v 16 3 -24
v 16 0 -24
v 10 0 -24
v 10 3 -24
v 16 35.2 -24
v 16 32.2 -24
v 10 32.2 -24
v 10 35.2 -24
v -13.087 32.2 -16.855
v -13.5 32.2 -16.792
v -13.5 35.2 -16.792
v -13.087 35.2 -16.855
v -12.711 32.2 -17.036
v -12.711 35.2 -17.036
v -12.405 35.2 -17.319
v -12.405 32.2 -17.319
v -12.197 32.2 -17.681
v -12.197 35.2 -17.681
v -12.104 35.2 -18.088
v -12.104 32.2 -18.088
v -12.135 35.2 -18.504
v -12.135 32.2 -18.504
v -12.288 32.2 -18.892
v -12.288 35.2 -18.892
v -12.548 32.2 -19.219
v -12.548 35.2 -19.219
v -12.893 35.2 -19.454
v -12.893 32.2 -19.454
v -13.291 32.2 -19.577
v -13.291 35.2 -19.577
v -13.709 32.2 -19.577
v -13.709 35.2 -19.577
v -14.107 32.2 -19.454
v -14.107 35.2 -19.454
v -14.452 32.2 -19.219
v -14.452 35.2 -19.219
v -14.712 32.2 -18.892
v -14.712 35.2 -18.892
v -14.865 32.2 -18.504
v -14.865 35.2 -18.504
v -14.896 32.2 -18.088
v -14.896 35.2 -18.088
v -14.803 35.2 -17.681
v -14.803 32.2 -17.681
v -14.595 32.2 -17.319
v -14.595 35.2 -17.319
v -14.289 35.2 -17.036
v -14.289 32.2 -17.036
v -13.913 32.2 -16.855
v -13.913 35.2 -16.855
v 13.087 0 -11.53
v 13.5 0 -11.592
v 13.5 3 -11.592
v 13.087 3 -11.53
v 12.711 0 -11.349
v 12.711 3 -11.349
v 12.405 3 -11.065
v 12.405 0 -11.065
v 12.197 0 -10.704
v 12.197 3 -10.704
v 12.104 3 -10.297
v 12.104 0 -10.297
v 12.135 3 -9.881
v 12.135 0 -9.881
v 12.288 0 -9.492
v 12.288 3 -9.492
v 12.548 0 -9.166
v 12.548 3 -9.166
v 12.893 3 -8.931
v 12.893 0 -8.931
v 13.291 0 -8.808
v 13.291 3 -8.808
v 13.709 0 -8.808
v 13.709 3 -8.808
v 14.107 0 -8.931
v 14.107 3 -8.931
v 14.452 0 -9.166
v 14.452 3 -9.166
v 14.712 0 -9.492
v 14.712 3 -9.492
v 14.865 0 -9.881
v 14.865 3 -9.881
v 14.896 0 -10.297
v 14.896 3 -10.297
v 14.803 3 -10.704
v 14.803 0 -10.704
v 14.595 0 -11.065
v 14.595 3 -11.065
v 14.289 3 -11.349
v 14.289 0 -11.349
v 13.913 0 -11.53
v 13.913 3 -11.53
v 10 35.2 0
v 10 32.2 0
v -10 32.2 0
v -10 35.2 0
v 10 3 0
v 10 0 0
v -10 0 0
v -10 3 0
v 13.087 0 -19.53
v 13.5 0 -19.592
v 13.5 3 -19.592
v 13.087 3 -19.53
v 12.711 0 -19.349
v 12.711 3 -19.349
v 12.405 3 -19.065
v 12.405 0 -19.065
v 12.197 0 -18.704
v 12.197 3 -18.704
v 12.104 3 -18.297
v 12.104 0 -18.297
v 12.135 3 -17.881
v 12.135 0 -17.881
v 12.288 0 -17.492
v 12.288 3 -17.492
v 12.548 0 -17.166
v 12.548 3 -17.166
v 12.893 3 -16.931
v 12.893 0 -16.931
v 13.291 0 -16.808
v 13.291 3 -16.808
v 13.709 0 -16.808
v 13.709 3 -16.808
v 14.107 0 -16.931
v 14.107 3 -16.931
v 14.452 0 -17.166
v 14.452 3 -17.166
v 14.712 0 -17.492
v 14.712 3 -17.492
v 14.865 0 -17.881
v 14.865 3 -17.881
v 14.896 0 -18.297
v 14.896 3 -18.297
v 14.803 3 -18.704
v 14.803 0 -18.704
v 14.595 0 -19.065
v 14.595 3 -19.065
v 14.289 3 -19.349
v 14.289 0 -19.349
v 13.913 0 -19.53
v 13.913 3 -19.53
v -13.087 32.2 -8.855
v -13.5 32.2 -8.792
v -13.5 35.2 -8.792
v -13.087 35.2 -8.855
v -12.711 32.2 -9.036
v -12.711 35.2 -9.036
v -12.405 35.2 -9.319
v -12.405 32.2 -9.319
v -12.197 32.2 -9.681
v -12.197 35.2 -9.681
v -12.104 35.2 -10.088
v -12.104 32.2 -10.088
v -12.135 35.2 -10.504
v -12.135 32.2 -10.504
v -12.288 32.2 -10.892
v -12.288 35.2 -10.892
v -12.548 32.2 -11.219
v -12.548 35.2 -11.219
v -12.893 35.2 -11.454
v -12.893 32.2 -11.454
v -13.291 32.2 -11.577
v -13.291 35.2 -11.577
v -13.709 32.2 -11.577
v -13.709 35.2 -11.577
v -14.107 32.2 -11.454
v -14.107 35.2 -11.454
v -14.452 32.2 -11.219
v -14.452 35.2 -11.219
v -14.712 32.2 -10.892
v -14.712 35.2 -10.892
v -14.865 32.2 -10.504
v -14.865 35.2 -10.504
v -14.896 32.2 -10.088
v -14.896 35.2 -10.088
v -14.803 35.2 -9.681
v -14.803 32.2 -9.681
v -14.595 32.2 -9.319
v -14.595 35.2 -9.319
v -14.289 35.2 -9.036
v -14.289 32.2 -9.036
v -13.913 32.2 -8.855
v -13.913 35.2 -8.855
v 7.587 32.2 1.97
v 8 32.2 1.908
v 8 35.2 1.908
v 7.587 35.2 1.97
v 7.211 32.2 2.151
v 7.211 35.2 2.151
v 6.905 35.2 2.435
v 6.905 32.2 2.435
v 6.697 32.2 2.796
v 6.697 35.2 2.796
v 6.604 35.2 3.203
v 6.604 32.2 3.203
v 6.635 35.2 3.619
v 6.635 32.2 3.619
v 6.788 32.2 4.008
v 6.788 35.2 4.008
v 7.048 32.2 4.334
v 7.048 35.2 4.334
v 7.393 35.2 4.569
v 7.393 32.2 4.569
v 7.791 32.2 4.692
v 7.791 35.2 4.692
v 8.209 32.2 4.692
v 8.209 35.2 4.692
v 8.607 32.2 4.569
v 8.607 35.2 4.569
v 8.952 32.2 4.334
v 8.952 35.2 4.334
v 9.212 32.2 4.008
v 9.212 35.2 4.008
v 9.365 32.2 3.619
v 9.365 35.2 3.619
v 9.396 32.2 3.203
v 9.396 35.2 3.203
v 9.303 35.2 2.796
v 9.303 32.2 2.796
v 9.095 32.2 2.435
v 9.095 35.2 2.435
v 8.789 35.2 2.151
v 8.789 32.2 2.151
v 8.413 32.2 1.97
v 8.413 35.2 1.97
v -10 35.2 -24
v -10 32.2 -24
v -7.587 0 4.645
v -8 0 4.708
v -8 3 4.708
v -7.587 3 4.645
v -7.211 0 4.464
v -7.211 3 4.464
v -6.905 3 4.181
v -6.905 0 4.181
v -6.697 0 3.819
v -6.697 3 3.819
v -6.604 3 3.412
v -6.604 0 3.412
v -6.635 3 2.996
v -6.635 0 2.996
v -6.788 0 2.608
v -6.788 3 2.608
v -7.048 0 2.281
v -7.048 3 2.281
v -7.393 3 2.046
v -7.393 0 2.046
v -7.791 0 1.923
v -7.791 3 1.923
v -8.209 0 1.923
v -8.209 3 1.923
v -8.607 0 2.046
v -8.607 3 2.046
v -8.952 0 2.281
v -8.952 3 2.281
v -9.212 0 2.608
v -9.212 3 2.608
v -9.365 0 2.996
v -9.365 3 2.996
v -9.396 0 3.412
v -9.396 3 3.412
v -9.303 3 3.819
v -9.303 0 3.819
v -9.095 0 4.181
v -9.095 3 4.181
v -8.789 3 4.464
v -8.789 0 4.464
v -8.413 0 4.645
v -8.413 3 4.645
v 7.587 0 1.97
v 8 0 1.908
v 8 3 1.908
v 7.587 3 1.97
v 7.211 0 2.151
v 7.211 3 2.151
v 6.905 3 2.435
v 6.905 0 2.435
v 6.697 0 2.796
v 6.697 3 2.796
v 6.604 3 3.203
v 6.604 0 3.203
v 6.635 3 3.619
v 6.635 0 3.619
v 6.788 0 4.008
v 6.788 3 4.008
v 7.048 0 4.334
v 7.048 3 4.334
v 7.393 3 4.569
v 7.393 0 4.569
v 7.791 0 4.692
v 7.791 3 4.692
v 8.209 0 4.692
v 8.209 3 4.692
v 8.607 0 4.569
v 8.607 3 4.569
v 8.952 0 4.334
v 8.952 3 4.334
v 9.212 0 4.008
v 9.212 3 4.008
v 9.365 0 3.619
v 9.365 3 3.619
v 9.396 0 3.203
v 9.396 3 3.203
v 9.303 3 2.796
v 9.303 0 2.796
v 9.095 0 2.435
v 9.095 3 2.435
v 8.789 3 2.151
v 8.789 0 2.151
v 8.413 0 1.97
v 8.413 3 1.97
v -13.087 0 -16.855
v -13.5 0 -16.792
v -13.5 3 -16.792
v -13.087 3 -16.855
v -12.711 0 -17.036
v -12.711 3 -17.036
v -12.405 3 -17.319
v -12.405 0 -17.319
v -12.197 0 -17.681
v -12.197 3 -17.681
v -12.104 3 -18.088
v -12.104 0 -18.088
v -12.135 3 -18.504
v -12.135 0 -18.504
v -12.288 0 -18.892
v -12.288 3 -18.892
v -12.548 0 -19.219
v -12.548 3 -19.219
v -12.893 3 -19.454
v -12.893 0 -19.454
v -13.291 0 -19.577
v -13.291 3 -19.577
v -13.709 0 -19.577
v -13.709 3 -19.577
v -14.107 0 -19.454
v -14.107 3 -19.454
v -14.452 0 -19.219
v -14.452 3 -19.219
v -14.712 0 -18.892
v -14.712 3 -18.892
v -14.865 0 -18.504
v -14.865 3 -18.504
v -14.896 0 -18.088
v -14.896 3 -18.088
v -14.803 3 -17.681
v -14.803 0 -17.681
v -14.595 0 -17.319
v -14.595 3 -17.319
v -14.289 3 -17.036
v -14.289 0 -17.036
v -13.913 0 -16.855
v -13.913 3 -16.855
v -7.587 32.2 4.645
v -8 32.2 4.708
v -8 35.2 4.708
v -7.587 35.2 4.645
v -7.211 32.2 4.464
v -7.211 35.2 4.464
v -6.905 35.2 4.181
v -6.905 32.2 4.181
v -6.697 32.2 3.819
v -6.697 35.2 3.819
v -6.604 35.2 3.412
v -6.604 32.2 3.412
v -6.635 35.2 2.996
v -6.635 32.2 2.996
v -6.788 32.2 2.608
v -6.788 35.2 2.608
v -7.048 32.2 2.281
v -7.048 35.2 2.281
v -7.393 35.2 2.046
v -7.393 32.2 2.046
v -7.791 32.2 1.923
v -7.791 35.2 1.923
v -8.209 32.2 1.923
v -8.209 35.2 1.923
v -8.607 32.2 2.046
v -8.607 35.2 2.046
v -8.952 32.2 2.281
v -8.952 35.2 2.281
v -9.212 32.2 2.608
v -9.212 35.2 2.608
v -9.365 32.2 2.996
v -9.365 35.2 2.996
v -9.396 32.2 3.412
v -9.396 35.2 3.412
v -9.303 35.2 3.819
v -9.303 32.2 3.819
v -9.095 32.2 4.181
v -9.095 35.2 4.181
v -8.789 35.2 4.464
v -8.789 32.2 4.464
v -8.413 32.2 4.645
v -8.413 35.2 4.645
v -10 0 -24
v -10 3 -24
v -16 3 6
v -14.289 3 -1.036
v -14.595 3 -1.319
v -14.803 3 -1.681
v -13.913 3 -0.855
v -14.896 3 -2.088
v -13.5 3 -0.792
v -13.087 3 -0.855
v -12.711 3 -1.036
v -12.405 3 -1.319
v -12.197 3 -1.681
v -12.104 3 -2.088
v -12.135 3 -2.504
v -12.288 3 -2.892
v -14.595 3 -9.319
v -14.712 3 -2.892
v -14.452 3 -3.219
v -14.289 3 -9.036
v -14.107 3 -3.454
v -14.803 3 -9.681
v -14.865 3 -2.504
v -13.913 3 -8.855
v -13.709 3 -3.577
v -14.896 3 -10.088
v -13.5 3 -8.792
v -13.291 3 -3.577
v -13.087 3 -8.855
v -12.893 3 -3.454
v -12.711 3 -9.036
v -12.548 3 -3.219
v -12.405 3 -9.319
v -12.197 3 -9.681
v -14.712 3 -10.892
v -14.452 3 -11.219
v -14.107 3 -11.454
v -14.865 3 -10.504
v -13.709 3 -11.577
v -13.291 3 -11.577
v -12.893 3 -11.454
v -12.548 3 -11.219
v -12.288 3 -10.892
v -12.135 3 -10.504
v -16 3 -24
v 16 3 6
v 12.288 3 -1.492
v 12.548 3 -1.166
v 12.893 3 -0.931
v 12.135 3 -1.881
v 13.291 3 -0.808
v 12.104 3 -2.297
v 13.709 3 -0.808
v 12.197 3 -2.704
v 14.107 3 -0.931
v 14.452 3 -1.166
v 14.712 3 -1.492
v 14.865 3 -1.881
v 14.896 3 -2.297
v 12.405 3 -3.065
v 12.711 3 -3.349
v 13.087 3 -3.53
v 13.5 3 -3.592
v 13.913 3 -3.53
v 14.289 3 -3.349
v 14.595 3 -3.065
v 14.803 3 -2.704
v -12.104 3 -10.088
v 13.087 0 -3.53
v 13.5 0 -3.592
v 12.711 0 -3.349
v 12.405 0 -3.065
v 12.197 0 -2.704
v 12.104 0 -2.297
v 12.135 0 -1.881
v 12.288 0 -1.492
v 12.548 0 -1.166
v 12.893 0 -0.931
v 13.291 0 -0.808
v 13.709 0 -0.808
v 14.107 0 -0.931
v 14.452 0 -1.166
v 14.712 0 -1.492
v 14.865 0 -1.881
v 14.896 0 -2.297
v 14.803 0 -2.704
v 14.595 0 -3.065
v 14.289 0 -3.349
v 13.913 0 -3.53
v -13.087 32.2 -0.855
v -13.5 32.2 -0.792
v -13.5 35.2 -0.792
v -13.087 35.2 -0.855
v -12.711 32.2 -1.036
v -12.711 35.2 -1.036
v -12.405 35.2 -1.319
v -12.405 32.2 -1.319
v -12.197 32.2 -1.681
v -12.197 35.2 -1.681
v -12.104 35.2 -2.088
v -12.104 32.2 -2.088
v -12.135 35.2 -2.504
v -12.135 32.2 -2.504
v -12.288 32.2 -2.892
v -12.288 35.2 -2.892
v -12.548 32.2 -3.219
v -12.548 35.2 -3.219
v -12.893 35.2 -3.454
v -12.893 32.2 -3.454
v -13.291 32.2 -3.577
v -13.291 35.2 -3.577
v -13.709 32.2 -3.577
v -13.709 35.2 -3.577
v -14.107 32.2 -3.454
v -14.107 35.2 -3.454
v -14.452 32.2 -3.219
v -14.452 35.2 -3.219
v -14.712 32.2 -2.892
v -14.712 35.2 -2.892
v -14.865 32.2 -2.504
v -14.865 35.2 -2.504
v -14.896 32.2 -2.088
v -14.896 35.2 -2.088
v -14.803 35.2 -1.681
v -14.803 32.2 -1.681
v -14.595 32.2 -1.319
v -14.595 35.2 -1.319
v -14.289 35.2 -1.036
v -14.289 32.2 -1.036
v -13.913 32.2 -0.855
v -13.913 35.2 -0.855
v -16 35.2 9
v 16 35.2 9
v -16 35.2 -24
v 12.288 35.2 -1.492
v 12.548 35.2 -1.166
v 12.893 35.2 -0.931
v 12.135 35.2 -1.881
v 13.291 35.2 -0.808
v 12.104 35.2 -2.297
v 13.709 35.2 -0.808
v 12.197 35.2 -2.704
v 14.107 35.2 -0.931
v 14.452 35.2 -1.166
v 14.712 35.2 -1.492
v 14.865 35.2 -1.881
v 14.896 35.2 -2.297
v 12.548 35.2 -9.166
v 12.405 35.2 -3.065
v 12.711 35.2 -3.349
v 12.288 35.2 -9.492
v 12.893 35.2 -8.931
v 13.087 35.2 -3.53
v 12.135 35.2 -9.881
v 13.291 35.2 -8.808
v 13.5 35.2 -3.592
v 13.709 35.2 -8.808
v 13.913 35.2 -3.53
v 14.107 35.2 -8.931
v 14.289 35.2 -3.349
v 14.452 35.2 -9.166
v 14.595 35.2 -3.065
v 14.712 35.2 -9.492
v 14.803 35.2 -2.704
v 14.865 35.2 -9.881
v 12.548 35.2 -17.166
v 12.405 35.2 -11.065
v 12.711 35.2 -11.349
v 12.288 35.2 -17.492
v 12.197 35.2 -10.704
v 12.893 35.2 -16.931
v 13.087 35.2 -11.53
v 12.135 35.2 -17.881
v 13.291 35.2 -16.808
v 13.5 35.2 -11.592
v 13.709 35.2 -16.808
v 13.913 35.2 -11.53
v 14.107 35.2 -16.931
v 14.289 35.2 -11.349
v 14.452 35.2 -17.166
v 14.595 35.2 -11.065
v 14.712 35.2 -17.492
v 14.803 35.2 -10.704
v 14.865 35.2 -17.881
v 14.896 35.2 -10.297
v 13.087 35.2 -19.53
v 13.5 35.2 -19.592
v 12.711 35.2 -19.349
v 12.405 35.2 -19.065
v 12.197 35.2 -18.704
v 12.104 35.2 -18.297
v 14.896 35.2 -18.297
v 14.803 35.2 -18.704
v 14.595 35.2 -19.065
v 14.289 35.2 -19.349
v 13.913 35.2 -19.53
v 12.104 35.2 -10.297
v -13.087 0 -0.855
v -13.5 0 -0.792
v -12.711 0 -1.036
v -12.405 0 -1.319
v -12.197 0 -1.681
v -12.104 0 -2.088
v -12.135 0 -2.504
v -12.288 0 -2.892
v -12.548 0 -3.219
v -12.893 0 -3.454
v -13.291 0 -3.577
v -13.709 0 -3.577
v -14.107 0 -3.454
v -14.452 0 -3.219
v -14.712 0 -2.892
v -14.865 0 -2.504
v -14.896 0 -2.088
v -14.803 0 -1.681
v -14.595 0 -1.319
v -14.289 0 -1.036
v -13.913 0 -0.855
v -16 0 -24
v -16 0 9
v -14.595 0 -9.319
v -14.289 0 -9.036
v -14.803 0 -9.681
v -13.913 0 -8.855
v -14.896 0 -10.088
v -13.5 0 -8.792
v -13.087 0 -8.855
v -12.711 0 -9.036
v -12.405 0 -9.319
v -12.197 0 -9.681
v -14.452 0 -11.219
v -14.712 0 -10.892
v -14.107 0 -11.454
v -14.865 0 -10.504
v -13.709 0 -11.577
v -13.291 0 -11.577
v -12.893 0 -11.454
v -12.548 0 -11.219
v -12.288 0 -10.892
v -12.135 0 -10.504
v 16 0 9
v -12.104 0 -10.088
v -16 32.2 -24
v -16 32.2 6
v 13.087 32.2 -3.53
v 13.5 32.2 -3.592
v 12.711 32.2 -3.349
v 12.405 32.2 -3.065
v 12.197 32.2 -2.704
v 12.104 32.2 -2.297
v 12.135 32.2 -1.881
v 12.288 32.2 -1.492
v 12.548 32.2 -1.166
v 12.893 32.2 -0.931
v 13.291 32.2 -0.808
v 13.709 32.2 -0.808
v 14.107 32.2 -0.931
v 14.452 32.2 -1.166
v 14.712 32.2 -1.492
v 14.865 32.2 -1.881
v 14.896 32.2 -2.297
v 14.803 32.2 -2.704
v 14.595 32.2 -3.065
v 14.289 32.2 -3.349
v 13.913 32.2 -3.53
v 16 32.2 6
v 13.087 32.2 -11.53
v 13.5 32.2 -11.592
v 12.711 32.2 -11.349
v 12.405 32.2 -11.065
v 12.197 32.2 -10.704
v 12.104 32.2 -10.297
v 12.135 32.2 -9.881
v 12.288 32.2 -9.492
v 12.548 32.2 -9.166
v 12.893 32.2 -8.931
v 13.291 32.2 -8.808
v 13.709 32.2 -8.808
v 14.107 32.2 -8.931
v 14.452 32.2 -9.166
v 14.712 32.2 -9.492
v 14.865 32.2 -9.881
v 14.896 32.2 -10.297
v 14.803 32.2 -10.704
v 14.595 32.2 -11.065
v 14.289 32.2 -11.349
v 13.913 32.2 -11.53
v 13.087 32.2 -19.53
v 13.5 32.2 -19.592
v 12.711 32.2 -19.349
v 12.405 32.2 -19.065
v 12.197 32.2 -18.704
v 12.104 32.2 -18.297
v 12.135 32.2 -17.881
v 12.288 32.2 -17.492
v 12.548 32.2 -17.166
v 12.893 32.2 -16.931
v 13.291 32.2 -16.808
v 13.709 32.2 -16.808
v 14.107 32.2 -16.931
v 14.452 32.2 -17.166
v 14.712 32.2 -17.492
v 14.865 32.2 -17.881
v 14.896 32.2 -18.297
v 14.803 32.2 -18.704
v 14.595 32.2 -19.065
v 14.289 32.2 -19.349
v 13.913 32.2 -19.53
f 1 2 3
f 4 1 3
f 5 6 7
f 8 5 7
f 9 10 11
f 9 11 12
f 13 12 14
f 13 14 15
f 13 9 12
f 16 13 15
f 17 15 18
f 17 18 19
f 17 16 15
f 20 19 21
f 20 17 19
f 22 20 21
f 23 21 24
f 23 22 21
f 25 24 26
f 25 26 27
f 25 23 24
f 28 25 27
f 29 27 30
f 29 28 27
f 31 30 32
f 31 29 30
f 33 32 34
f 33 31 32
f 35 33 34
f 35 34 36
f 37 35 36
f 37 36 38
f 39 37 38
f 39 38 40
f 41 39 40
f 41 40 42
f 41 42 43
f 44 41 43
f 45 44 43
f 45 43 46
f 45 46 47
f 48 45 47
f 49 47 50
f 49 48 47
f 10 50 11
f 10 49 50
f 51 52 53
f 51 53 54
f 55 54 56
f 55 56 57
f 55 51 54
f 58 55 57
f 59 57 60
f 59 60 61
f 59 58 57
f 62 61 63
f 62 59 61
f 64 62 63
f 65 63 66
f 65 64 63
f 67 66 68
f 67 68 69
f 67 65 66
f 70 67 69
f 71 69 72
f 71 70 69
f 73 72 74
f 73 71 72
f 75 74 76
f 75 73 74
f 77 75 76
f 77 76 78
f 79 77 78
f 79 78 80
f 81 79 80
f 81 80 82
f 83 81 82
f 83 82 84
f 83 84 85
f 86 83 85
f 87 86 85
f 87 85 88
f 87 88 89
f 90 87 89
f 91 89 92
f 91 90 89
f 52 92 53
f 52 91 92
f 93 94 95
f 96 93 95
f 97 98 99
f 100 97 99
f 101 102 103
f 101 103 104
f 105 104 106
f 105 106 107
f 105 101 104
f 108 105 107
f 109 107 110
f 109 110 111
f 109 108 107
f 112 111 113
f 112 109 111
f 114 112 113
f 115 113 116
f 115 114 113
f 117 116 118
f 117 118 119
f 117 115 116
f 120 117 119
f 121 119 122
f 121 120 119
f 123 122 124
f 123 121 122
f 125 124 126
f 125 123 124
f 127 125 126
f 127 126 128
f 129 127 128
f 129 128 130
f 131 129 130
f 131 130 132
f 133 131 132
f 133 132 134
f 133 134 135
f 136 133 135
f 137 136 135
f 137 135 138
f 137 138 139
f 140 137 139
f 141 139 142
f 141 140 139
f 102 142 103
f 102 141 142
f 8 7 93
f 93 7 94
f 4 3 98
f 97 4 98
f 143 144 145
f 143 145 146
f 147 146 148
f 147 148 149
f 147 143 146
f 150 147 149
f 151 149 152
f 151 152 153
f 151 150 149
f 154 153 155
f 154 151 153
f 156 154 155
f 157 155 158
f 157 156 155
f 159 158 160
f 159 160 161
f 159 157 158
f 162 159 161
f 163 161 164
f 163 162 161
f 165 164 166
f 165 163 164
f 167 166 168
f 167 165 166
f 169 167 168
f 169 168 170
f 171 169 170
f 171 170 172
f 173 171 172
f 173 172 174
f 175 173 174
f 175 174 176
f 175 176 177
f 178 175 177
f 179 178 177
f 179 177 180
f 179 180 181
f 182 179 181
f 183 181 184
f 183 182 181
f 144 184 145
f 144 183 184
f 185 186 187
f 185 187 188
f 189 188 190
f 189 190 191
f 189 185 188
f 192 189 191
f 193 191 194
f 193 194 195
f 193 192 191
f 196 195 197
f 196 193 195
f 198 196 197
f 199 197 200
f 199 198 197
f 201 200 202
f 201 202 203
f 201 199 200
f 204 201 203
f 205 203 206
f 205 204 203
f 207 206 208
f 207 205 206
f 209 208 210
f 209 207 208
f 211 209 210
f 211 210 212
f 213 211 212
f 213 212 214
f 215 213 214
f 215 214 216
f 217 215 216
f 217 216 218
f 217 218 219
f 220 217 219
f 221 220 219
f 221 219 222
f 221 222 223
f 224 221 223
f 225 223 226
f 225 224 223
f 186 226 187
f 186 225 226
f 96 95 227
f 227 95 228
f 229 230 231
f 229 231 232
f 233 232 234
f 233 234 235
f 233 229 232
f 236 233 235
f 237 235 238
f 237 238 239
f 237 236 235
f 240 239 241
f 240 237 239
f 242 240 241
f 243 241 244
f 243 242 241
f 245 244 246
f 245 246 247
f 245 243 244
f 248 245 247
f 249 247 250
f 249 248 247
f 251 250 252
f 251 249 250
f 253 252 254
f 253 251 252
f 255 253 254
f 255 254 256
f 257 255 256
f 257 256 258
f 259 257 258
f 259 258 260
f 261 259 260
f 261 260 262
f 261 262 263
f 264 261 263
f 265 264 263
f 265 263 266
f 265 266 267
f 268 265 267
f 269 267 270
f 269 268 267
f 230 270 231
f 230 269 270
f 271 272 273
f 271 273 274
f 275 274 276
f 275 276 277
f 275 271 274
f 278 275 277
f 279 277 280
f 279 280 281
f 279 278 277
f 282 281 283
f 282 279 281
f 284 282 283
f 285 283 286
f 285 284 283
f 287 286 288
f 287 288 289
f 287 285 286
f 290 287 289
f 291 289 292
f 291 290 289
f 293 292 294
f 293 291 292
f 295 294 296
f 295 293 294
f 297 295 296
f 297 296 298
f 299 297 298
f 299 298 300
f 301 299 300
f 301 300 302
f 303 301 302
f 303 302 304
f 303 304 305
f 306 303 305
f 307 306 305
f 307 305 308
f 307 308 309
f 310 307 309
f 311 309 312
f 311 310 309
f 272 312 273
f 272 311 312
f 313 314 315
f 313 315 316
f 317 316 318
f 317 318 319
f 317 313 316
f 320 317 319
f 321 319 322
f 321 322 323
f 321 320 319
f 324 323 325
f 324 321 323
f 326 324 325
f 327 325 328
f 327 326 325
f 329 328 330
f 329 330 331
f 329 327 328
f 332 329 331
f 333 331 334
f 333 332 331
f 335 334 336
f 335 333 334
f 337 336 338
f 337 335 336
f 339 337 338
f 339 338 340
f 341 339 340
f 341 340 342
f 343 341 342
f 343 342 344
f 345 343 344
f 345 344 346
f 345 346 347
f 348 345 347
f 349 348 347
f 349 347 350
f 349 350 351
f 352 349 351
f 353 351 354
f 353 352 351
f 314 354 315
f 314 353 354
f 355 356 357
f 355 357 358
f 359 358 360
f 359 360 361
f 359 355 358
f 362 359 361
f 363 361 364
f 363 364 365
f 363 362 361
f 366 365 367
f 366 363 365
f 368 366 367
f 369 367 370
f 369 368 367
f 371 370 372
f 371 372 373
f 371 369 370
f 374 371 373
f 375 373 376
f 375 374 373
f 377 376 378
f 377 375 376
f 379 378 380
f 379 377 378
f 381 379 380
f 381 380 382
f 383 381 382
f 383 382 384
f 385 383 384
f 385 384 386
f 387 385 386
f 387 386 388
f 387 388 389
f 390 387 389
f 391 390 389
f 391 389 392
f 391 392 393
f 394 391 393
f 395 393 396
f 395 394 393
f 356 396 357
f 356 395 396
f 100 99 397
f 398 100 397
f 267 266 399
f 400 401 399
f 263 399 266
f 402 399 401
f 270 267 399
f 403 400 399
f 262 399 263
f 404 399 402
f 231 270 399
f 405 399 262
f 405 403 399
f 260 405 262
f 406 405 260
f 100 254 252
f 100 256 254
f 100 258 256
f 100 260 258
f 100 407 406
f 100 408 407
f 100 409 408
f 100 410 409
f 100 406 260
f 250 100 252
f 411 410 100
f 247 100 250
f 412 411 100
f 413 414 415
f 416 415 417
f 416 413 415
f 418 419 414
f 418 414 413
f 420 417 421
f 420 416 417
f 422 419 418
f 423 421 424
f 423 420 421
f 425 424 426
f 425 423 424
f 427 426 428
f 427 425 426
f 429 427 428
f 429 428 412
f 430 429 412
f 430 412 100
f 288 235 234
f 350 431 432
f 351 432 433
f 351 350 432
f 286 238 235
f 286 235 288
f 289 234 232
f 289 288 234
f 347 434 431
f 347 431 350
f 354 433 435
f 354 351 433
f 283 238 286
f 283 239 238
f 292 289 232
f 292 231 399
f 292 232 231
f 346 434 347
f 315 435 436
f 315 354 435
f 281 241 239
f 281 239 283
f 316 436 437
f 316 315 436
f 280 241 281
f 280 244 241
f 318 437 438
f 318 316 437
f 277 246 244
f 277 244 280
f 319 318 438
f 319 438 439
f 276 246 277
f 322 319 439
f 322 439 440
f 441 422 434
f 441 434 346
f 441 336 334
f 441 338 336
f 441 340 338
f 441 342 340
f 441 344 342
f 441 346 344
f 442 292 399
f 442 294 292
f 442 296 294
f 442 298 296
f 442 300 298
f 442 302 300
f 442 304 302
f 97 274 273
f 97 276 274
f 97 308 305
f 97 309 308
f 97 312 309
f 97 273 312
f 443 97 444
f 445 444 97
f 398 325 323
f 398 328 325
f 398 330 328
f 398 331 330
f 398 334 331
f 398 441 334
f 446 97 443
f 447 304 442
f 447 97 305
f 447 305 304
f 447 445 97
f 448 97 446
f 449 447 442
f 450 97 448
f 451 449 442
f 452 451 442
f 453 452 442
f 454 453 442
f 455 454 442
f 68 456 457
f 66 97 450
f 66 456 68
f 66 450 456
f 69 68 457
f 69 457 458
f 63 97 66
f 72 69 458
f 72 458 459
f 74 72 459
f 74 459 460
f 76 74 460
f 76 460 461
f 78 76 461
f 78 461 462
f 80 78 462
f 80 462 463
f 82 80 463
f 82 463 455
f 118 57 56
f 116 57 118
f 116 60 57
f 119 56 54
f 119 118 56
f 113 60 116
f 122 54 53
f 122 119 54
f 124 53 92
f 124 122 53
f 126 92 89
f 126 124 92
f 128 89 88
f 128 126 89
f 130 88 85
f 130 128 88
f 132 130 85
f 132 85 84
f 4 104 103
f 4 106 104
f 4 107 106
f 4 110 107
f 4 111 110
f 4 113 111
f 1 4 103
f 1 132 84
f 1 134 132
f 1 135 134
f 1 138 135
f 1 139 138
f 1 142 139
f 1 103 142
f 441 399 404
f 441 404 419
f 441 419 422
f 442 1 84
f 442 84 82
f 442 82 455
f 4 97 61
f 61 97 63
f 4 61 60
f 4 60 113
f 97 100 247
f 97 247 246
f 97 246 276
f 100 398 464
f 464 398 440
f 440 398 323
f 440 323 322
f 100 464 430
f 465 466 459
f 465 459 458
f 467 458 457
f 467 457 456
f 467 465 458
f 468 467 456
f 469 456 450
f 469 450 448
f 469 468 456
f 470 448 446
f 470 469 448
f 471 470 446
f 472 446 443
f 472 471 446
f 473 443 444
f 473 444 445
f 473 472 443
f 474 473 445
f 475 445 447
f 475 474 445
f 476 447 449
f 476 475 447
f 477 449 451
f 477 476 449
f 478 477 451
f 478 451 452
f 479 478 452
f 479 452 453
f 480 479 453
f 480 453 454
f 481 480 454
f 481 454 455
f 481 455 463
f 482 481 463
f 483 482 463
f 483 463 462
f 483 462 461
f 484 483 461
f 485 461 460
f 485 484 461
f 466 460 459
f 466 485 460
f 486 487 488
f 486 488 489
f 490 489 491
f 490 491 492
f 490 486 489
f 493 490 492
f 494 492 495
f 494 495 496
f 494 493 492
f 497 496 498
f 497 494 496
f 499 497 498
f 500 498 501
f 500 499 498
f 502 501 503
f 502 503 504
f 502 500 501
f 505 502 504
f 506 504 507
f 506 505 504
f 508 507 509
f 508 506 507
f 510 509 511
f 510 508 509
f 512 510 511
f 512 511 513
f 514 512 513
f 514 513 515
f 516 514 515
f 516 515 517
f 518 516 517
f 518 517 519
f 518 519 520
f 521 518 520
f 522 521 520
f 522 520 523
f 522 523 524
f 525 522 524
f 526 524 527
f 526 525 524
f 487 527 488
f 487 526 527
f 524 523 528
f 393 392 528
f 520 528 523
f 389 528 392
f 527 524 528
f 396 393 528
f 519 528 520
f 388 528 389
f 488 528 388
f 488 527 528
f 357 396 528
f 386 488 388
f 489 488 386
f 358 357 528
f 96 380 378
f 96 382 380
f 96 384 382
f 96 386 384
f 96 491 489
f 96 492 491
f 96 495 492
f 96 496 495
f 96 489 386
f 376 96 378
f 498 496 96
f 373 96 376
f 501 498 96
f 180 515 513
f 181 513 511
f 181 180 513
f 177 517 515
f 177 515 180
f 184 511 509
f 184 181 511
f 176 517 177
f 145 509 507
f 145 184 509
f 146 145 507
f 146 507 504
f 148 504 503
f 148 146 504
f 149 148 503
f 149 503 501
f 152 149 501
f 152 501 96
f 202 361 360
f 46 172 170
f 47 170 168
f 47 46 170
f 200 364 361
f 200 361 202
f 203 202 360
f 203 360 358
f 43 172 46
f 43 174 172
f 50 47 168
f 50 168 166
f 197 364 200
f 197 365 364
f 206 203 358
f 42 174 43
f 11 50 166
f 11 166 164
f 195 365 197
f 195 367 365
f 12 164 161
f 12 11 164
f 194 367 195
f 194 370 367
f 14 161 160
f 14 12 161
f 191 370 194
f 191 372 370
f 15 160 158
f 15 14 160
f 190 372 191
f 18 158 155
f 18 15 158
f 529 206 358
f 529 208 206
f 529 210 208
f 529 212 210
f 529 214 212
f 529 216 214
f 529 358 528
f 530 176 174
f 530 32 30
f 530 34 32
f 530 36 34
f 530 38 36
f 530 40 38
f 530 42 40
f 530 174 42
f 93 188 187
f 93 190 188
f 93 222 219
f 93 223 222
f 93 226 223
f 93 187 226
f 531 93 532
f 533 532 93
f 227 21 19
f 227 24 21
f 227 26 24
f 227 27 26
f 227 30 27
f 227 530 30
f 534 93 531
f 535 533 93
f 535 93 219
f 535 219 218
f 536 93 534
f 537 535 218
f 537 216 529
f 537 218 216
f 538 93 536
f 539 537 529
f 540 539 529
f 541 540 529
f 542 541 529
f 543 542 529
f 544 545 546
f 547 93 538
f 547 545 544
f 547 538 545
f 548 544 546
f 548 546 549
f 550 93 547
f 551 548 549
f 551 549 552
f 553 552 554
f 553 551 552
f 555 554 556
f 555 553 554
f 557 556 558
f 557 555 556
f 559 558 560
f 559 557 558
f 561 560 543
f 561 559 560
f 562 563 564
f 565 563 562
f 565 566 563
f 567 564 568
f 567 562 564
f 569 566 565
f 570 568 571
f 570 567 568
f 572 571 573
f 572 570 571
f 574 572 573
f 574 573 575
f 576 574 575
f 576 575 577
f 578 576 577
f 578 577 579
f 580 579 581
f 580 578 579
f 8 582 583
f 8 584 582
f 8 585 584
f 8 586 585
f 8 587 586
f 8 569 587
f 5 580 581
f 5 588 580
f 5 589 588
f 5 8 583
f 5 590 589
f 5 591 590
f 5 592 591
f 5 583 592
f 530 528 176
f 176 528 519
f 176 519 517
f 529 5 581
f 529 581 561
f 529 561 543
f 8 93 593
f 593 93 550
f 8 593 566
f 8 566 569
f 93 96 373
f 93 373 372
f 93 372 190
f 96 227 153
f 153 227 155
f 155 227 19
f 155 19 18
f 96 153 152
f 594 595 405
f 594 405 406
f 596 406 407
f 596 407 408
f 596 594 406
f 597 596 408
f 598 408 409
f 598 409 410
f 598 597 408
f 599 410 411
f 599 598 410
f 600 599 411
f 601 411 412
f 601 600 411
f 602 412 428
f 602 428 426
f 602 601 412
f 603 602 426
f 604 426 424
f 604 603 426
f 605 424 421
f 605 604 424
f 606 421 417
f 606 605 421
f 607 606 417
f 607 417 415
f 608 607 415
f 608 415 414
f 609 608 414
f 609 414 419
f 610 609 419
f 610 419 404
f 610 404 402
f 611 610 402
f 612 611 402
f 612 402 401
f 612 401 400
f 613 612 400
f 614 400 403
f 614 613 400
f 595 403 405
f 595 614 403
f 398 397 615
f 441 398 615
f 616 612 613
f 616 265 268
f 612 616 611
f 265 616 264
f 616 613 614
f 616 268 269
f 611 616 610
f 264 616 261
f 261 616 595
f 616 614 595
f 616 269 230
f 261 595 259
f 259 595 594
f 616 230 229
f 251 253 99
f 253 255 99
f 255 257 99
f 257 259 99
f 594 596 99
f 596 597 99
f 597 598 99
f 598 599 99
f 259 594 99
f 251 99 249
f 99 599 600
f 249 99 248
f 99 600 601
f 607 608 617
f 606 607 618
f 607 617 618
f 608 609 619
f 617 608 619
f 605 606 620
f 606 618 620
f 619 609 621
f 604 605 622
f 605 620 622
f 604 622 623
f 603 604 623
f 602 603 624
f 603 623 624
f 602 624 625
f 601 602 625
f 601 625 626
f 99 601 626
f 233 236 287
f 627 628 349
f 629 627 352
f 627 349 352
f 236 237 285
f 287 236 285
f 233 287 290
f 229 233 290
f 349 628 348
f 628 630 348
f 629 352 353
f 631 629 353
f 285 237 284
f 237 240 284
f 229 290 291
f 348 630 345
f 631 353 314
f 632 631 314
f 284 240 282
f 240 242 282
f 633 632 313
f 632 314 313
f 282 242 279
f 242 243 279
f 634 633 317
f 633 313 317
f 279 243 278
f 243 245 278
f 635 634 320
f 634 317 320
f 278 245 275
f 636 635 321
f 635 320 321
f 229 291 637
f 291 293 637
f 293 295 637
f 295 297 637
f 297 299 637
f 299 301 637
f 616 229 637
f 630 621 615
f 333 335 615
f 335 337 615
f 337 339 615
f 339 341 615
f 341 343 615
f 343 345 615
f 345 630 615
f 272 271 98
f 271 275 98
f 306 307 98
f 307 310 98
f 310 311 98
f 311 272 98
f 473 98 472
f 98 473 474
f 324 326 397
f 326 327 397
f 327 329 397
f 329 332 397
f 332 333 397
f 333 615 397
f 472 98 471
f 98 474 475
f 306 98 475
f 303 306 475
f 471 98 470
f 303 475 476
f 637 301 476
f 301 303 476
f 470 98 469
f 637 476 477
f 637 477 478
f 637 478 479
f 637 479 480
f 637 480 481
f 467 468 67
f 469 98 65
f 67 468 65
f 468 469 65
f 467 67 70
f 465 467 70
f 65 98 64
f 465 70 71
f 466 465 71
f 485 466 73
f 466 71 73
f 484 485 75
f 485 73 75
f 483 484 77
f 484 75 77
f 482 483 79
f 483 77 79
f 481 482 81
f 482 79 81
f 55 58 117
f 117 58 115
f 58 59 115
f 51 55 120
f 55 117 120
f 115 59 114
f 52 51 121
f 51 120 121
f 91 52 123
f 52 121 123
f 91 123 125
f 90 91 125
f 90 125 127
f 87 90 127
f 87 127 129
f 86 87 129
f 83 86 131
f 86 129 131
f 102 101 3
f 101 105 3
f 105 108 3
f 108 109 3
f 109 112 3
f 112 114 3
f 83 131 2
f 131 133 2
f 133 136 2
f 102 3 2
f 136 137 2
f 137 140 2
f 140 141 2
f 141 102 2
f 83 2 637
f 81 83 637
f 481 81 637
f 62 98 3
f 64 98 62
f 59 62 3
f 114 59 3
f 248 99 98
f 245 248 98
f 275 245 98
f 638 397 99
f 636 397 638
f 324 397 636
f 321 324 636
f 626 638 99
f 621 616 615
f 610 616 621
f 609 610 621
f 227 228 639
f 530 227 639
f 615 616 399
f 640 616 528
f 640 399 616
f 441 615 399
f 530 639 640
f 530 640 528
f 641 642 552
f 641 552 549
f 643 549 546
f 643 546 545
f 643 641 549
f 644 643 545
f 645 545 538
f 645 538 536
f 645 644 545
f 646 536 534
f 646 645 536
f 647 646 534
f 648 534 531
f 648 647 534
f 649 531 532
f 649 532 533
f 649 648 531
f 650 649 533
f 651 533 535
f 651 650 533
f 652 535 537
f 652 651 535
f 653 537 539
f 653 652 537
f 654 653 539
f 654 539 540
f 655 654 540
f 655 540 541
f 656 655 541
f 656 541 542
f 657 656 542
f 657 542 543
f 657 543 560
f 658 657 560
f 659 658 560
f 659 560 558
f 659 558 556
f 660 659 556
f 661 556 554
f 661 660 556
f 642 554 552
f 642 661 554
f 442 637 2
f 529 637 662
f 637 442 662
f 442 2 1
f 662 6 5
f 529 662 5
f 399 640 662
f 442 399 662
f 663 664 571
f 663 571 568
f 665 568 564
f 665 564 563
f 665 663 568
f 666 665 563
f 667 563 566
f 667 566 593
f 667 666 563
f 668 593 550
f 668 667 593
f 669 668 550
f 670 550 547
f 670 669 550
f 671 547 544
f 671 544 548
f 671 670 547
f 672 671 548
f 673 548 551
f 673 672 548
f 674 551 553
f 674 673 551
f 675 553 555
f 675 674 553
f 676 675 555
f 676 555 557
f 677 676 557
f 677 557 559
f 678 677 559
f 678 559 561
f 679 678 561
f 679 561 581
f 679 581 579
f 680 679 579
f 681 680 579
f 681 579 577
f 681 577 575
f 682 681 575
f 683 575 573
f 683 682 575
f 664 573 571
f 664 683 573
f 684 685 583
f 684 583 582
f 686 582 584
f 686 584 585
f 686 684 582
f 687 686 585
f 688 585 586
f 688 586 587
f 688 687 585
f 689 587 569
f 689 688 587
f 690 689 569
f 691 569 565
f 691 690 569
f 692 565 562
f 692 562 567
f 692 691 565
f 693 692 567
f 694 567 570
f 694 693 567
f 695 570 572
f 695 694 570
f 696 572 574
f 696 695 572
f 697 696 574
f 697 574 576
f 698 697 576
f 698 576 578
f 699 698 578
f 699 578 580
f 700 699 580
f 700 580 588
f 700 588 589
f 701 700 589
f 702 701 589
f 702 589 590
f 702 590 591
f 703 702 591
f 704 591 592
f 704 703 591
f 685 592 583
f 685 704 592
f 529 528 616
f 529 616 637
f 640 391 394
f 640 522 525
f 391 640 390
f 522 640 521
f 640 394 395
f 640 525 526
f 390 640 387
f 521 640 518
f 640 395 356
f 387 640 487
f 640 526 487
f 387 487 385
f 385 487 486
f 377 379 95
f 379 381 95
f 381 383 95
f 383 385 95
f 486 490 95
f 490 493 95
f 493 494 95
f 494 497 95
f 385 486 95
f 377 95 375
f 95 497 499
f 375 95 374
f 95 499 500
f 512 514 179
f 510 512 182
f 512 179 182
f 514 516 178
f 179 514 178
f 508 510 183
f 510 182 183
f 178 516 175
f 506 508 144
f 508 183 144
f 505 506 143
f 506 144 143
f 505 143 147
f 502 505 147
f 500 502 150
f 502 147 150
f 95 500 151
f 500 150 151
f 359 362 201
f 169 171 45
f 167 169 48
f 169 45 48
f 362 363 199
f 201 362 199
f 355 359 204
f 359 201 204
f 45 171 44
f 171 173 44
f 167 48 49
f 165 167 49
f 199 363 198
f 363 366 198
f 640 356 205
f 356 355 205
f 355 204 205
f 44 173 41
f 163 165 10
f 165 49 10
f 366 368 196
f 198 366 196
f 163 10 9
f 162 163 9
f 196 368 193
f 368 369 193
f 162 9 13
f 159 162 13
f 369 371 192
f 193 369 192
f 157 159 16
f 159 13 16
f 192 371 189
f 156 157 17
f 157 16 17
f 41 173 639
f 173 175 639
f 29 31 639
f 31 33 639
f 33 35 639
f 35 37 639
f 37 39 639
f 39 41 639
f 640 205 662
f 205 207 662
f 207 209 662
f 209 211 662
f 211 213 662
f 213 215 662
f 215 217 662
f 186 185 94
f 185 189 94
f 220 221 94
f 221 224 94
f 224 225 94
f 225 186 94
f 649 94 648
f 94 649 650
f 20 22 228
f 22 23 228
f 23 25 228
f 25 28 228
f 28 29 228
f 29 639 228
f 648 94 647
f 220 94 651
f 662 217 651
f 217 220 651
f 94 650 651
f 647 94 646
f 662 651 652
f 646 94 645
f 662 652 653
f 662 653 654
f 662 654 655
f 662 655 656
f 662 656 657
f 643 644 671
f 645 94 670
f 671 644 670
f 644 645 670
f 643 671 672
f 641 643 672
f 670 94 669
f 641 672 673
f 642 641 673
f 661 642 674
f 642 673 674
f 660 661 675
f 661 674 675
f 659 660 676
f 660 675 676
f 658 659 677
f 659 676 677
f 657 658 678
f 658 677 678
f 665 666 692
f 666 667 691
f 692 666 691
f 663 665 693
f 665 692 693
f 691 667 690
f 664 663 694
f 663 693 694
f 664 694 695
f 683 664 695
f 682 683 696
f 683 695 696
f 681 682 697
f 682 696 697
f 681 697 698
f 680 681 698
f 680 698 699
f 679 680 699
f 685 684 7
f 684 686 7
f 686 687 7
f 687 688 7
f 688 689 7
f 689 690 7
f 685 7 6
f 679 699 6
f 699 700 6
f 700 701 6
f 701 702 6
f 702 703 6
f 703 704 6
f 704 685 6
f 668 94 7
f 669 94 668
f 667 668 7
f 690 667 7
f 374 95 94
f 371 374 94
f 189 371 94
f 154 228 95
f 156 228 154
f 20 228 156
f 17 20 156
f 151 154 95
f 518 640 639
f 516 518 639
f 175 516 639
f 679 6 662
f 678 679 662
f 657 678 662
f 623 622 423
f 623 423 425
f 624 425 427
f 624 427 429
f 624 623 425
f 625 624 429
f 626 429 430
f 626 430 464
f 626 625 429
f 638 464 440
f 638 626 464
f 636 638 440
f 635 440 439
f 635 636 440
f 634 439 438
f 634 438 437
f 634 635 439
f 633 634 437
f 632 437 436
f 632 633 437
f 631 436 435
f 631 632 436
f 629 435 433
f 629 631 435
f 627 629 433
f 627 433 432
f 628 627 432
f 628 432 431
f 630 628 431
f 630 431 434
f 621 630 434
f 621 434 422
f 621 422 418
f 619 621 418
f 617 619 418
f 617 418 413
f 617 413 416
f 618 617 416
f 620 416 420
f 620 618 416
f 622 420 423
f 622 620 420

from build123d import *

# Parameters (mm, degrees)
SKETCH1_R           = 1.4
BOSS_EXTRUDE1_DEPTH = 3
SKETCH2_R           = 1.4
BOSS_EXTRUDE2_DEPTH = 3
SKETCH3_W           = 32
SKETCH3_H           = 35.2
BOSS_EXTRUDE3_DEPTH = 3


with BuildPart() as part:
    # Sketch1 → Boss-Extrude1 (new body)
    with BuildSketch(Plane(origin=(0, 0, 0), x_dir=(1, 0, 0), z_dir=(0, 1, 0))):
        Polygon((-16, 24), (-16, -6), (16, -6), (16, 24), (10, 24), (10, 0), (-10, 0), (-10, 24), align=None)
        with Locations(Location((-8, -3.307692308, 0), (0, 0, 270))):
            Circle(SKETCH1_R, mode=Mode.SUBTRACT)
        with Locations(Location((8, -3.307692308, 0), (0, 0, 90))):
            Circle(SKETCH1_R, mode=Mode.SUBTRACT)
        with Locations(Location((-13.5, 18.192307692, 0), (0, 0, 270))):
            Circle(SKETCH1_R, mode=Mode.SUBTRACT)
        with Locations(Location((-13.5, 10.192307692, 0), (0, 0, 270))):
            Circle(SKETCH1_R, mode=Mode.SUBTRACT)
        with Locations(Location((-13.5, 2.192307692, 0), (0, 0, 270))):
            Circle(SKETCH1_R, mode=Mode.SUBTRACT)
        with Locations(Location((13.5, 2.192307692, 0), (0, 0, 90))):
            Circle(SKETCH1_R, mode=Mode.SUBTRACT)
        with Locations(Location((13.5, 10.192307692, 0), (0, 0, 90))):
            Circle(SKETCH1_R, mode=Mode.SUBTRACT)
        with Locations(Location((13.5, 18.192307692, 0), (0, 0, 90))):
            Circle(SKETCH1_R, mode=Mode.SUBTRACT)
    extrude(amount=BOSS_EXTRUDE1_DEPTH)



with BuildPart() as body_2:
    # Sketch2 → Boss-Extrude2 (new body)
    with BuildSketch(Plane(origin=(0, 32.2, 0), x_dir=(1, 0, 0), z_dir=(0, 1, 0))):
        Polygon((16, 24), (10, 24), (10, 0), (-10, 0), (-10, 24), (-16, 24), (-16, -6), (16, -6), align=None)
        with Locations(Location((-13.5, 18.192307692, 0), (0, 0, 270))):
            Circle(SKETCH2_R, mode=Mode.SUBTRACT)
        with Locations(Location((13.5, 18.192307692, 0), (0, 0, 90))):
            Circle(SKETCH2_R, mode=Mode.SUBTRACT)
        with Locations(Location((13.5, 10.192307692, 0), (0, 0, 90))):
            Circle(SKETCH2_R, mode=Mode.SUBTRACT)
        with Locations(Location((13.5, 2.192307692, 0), (0, 0, 90))):
            Circle(SKETCH2_R, mode=Mode.SUBTRACT)
        with Locations(Location((8, -3.307692308, 0), (0, 0, 90))):
            Circle(SKETCH2_R, mode=Mode.SUBTRACT)
        with Locations(Location((-8, -3.307692308, 0), (0, 0, 270))):
            Circle(SKETCH2_R, mode=Mode.SUBTRACT)
        with Locations(Location((-13.5, 10.192307692, 0), (0, 0, 270))):
            Circle(SKETCH2_R, mode=Mode.SUBTRACT)
        with Locations(Location((-13.5, 2.192307692, 0), (0, 0, 270))):
            Circle(SKETCH2_R, mode=Mode.SUBTRACT)
    extrude(amount=BOSS_EXTRUDE2_DEPTH)


with BuildPart() as part_1:
    add(part.part)

    add(body_2.part)  # Boss-Extrude3 merges body 2
    # Sketch3 → Boss-Extrude3 (add)
    with BuildSketch(Plane.XY.offset(6)):
        with Locations((0, 17.6)):
            Rectangle(SKETCH3_W, SKETCH3_H)
    extrude(amount=BOSS_EXTRUDE3_DEPTH)


solid = part_1.part
